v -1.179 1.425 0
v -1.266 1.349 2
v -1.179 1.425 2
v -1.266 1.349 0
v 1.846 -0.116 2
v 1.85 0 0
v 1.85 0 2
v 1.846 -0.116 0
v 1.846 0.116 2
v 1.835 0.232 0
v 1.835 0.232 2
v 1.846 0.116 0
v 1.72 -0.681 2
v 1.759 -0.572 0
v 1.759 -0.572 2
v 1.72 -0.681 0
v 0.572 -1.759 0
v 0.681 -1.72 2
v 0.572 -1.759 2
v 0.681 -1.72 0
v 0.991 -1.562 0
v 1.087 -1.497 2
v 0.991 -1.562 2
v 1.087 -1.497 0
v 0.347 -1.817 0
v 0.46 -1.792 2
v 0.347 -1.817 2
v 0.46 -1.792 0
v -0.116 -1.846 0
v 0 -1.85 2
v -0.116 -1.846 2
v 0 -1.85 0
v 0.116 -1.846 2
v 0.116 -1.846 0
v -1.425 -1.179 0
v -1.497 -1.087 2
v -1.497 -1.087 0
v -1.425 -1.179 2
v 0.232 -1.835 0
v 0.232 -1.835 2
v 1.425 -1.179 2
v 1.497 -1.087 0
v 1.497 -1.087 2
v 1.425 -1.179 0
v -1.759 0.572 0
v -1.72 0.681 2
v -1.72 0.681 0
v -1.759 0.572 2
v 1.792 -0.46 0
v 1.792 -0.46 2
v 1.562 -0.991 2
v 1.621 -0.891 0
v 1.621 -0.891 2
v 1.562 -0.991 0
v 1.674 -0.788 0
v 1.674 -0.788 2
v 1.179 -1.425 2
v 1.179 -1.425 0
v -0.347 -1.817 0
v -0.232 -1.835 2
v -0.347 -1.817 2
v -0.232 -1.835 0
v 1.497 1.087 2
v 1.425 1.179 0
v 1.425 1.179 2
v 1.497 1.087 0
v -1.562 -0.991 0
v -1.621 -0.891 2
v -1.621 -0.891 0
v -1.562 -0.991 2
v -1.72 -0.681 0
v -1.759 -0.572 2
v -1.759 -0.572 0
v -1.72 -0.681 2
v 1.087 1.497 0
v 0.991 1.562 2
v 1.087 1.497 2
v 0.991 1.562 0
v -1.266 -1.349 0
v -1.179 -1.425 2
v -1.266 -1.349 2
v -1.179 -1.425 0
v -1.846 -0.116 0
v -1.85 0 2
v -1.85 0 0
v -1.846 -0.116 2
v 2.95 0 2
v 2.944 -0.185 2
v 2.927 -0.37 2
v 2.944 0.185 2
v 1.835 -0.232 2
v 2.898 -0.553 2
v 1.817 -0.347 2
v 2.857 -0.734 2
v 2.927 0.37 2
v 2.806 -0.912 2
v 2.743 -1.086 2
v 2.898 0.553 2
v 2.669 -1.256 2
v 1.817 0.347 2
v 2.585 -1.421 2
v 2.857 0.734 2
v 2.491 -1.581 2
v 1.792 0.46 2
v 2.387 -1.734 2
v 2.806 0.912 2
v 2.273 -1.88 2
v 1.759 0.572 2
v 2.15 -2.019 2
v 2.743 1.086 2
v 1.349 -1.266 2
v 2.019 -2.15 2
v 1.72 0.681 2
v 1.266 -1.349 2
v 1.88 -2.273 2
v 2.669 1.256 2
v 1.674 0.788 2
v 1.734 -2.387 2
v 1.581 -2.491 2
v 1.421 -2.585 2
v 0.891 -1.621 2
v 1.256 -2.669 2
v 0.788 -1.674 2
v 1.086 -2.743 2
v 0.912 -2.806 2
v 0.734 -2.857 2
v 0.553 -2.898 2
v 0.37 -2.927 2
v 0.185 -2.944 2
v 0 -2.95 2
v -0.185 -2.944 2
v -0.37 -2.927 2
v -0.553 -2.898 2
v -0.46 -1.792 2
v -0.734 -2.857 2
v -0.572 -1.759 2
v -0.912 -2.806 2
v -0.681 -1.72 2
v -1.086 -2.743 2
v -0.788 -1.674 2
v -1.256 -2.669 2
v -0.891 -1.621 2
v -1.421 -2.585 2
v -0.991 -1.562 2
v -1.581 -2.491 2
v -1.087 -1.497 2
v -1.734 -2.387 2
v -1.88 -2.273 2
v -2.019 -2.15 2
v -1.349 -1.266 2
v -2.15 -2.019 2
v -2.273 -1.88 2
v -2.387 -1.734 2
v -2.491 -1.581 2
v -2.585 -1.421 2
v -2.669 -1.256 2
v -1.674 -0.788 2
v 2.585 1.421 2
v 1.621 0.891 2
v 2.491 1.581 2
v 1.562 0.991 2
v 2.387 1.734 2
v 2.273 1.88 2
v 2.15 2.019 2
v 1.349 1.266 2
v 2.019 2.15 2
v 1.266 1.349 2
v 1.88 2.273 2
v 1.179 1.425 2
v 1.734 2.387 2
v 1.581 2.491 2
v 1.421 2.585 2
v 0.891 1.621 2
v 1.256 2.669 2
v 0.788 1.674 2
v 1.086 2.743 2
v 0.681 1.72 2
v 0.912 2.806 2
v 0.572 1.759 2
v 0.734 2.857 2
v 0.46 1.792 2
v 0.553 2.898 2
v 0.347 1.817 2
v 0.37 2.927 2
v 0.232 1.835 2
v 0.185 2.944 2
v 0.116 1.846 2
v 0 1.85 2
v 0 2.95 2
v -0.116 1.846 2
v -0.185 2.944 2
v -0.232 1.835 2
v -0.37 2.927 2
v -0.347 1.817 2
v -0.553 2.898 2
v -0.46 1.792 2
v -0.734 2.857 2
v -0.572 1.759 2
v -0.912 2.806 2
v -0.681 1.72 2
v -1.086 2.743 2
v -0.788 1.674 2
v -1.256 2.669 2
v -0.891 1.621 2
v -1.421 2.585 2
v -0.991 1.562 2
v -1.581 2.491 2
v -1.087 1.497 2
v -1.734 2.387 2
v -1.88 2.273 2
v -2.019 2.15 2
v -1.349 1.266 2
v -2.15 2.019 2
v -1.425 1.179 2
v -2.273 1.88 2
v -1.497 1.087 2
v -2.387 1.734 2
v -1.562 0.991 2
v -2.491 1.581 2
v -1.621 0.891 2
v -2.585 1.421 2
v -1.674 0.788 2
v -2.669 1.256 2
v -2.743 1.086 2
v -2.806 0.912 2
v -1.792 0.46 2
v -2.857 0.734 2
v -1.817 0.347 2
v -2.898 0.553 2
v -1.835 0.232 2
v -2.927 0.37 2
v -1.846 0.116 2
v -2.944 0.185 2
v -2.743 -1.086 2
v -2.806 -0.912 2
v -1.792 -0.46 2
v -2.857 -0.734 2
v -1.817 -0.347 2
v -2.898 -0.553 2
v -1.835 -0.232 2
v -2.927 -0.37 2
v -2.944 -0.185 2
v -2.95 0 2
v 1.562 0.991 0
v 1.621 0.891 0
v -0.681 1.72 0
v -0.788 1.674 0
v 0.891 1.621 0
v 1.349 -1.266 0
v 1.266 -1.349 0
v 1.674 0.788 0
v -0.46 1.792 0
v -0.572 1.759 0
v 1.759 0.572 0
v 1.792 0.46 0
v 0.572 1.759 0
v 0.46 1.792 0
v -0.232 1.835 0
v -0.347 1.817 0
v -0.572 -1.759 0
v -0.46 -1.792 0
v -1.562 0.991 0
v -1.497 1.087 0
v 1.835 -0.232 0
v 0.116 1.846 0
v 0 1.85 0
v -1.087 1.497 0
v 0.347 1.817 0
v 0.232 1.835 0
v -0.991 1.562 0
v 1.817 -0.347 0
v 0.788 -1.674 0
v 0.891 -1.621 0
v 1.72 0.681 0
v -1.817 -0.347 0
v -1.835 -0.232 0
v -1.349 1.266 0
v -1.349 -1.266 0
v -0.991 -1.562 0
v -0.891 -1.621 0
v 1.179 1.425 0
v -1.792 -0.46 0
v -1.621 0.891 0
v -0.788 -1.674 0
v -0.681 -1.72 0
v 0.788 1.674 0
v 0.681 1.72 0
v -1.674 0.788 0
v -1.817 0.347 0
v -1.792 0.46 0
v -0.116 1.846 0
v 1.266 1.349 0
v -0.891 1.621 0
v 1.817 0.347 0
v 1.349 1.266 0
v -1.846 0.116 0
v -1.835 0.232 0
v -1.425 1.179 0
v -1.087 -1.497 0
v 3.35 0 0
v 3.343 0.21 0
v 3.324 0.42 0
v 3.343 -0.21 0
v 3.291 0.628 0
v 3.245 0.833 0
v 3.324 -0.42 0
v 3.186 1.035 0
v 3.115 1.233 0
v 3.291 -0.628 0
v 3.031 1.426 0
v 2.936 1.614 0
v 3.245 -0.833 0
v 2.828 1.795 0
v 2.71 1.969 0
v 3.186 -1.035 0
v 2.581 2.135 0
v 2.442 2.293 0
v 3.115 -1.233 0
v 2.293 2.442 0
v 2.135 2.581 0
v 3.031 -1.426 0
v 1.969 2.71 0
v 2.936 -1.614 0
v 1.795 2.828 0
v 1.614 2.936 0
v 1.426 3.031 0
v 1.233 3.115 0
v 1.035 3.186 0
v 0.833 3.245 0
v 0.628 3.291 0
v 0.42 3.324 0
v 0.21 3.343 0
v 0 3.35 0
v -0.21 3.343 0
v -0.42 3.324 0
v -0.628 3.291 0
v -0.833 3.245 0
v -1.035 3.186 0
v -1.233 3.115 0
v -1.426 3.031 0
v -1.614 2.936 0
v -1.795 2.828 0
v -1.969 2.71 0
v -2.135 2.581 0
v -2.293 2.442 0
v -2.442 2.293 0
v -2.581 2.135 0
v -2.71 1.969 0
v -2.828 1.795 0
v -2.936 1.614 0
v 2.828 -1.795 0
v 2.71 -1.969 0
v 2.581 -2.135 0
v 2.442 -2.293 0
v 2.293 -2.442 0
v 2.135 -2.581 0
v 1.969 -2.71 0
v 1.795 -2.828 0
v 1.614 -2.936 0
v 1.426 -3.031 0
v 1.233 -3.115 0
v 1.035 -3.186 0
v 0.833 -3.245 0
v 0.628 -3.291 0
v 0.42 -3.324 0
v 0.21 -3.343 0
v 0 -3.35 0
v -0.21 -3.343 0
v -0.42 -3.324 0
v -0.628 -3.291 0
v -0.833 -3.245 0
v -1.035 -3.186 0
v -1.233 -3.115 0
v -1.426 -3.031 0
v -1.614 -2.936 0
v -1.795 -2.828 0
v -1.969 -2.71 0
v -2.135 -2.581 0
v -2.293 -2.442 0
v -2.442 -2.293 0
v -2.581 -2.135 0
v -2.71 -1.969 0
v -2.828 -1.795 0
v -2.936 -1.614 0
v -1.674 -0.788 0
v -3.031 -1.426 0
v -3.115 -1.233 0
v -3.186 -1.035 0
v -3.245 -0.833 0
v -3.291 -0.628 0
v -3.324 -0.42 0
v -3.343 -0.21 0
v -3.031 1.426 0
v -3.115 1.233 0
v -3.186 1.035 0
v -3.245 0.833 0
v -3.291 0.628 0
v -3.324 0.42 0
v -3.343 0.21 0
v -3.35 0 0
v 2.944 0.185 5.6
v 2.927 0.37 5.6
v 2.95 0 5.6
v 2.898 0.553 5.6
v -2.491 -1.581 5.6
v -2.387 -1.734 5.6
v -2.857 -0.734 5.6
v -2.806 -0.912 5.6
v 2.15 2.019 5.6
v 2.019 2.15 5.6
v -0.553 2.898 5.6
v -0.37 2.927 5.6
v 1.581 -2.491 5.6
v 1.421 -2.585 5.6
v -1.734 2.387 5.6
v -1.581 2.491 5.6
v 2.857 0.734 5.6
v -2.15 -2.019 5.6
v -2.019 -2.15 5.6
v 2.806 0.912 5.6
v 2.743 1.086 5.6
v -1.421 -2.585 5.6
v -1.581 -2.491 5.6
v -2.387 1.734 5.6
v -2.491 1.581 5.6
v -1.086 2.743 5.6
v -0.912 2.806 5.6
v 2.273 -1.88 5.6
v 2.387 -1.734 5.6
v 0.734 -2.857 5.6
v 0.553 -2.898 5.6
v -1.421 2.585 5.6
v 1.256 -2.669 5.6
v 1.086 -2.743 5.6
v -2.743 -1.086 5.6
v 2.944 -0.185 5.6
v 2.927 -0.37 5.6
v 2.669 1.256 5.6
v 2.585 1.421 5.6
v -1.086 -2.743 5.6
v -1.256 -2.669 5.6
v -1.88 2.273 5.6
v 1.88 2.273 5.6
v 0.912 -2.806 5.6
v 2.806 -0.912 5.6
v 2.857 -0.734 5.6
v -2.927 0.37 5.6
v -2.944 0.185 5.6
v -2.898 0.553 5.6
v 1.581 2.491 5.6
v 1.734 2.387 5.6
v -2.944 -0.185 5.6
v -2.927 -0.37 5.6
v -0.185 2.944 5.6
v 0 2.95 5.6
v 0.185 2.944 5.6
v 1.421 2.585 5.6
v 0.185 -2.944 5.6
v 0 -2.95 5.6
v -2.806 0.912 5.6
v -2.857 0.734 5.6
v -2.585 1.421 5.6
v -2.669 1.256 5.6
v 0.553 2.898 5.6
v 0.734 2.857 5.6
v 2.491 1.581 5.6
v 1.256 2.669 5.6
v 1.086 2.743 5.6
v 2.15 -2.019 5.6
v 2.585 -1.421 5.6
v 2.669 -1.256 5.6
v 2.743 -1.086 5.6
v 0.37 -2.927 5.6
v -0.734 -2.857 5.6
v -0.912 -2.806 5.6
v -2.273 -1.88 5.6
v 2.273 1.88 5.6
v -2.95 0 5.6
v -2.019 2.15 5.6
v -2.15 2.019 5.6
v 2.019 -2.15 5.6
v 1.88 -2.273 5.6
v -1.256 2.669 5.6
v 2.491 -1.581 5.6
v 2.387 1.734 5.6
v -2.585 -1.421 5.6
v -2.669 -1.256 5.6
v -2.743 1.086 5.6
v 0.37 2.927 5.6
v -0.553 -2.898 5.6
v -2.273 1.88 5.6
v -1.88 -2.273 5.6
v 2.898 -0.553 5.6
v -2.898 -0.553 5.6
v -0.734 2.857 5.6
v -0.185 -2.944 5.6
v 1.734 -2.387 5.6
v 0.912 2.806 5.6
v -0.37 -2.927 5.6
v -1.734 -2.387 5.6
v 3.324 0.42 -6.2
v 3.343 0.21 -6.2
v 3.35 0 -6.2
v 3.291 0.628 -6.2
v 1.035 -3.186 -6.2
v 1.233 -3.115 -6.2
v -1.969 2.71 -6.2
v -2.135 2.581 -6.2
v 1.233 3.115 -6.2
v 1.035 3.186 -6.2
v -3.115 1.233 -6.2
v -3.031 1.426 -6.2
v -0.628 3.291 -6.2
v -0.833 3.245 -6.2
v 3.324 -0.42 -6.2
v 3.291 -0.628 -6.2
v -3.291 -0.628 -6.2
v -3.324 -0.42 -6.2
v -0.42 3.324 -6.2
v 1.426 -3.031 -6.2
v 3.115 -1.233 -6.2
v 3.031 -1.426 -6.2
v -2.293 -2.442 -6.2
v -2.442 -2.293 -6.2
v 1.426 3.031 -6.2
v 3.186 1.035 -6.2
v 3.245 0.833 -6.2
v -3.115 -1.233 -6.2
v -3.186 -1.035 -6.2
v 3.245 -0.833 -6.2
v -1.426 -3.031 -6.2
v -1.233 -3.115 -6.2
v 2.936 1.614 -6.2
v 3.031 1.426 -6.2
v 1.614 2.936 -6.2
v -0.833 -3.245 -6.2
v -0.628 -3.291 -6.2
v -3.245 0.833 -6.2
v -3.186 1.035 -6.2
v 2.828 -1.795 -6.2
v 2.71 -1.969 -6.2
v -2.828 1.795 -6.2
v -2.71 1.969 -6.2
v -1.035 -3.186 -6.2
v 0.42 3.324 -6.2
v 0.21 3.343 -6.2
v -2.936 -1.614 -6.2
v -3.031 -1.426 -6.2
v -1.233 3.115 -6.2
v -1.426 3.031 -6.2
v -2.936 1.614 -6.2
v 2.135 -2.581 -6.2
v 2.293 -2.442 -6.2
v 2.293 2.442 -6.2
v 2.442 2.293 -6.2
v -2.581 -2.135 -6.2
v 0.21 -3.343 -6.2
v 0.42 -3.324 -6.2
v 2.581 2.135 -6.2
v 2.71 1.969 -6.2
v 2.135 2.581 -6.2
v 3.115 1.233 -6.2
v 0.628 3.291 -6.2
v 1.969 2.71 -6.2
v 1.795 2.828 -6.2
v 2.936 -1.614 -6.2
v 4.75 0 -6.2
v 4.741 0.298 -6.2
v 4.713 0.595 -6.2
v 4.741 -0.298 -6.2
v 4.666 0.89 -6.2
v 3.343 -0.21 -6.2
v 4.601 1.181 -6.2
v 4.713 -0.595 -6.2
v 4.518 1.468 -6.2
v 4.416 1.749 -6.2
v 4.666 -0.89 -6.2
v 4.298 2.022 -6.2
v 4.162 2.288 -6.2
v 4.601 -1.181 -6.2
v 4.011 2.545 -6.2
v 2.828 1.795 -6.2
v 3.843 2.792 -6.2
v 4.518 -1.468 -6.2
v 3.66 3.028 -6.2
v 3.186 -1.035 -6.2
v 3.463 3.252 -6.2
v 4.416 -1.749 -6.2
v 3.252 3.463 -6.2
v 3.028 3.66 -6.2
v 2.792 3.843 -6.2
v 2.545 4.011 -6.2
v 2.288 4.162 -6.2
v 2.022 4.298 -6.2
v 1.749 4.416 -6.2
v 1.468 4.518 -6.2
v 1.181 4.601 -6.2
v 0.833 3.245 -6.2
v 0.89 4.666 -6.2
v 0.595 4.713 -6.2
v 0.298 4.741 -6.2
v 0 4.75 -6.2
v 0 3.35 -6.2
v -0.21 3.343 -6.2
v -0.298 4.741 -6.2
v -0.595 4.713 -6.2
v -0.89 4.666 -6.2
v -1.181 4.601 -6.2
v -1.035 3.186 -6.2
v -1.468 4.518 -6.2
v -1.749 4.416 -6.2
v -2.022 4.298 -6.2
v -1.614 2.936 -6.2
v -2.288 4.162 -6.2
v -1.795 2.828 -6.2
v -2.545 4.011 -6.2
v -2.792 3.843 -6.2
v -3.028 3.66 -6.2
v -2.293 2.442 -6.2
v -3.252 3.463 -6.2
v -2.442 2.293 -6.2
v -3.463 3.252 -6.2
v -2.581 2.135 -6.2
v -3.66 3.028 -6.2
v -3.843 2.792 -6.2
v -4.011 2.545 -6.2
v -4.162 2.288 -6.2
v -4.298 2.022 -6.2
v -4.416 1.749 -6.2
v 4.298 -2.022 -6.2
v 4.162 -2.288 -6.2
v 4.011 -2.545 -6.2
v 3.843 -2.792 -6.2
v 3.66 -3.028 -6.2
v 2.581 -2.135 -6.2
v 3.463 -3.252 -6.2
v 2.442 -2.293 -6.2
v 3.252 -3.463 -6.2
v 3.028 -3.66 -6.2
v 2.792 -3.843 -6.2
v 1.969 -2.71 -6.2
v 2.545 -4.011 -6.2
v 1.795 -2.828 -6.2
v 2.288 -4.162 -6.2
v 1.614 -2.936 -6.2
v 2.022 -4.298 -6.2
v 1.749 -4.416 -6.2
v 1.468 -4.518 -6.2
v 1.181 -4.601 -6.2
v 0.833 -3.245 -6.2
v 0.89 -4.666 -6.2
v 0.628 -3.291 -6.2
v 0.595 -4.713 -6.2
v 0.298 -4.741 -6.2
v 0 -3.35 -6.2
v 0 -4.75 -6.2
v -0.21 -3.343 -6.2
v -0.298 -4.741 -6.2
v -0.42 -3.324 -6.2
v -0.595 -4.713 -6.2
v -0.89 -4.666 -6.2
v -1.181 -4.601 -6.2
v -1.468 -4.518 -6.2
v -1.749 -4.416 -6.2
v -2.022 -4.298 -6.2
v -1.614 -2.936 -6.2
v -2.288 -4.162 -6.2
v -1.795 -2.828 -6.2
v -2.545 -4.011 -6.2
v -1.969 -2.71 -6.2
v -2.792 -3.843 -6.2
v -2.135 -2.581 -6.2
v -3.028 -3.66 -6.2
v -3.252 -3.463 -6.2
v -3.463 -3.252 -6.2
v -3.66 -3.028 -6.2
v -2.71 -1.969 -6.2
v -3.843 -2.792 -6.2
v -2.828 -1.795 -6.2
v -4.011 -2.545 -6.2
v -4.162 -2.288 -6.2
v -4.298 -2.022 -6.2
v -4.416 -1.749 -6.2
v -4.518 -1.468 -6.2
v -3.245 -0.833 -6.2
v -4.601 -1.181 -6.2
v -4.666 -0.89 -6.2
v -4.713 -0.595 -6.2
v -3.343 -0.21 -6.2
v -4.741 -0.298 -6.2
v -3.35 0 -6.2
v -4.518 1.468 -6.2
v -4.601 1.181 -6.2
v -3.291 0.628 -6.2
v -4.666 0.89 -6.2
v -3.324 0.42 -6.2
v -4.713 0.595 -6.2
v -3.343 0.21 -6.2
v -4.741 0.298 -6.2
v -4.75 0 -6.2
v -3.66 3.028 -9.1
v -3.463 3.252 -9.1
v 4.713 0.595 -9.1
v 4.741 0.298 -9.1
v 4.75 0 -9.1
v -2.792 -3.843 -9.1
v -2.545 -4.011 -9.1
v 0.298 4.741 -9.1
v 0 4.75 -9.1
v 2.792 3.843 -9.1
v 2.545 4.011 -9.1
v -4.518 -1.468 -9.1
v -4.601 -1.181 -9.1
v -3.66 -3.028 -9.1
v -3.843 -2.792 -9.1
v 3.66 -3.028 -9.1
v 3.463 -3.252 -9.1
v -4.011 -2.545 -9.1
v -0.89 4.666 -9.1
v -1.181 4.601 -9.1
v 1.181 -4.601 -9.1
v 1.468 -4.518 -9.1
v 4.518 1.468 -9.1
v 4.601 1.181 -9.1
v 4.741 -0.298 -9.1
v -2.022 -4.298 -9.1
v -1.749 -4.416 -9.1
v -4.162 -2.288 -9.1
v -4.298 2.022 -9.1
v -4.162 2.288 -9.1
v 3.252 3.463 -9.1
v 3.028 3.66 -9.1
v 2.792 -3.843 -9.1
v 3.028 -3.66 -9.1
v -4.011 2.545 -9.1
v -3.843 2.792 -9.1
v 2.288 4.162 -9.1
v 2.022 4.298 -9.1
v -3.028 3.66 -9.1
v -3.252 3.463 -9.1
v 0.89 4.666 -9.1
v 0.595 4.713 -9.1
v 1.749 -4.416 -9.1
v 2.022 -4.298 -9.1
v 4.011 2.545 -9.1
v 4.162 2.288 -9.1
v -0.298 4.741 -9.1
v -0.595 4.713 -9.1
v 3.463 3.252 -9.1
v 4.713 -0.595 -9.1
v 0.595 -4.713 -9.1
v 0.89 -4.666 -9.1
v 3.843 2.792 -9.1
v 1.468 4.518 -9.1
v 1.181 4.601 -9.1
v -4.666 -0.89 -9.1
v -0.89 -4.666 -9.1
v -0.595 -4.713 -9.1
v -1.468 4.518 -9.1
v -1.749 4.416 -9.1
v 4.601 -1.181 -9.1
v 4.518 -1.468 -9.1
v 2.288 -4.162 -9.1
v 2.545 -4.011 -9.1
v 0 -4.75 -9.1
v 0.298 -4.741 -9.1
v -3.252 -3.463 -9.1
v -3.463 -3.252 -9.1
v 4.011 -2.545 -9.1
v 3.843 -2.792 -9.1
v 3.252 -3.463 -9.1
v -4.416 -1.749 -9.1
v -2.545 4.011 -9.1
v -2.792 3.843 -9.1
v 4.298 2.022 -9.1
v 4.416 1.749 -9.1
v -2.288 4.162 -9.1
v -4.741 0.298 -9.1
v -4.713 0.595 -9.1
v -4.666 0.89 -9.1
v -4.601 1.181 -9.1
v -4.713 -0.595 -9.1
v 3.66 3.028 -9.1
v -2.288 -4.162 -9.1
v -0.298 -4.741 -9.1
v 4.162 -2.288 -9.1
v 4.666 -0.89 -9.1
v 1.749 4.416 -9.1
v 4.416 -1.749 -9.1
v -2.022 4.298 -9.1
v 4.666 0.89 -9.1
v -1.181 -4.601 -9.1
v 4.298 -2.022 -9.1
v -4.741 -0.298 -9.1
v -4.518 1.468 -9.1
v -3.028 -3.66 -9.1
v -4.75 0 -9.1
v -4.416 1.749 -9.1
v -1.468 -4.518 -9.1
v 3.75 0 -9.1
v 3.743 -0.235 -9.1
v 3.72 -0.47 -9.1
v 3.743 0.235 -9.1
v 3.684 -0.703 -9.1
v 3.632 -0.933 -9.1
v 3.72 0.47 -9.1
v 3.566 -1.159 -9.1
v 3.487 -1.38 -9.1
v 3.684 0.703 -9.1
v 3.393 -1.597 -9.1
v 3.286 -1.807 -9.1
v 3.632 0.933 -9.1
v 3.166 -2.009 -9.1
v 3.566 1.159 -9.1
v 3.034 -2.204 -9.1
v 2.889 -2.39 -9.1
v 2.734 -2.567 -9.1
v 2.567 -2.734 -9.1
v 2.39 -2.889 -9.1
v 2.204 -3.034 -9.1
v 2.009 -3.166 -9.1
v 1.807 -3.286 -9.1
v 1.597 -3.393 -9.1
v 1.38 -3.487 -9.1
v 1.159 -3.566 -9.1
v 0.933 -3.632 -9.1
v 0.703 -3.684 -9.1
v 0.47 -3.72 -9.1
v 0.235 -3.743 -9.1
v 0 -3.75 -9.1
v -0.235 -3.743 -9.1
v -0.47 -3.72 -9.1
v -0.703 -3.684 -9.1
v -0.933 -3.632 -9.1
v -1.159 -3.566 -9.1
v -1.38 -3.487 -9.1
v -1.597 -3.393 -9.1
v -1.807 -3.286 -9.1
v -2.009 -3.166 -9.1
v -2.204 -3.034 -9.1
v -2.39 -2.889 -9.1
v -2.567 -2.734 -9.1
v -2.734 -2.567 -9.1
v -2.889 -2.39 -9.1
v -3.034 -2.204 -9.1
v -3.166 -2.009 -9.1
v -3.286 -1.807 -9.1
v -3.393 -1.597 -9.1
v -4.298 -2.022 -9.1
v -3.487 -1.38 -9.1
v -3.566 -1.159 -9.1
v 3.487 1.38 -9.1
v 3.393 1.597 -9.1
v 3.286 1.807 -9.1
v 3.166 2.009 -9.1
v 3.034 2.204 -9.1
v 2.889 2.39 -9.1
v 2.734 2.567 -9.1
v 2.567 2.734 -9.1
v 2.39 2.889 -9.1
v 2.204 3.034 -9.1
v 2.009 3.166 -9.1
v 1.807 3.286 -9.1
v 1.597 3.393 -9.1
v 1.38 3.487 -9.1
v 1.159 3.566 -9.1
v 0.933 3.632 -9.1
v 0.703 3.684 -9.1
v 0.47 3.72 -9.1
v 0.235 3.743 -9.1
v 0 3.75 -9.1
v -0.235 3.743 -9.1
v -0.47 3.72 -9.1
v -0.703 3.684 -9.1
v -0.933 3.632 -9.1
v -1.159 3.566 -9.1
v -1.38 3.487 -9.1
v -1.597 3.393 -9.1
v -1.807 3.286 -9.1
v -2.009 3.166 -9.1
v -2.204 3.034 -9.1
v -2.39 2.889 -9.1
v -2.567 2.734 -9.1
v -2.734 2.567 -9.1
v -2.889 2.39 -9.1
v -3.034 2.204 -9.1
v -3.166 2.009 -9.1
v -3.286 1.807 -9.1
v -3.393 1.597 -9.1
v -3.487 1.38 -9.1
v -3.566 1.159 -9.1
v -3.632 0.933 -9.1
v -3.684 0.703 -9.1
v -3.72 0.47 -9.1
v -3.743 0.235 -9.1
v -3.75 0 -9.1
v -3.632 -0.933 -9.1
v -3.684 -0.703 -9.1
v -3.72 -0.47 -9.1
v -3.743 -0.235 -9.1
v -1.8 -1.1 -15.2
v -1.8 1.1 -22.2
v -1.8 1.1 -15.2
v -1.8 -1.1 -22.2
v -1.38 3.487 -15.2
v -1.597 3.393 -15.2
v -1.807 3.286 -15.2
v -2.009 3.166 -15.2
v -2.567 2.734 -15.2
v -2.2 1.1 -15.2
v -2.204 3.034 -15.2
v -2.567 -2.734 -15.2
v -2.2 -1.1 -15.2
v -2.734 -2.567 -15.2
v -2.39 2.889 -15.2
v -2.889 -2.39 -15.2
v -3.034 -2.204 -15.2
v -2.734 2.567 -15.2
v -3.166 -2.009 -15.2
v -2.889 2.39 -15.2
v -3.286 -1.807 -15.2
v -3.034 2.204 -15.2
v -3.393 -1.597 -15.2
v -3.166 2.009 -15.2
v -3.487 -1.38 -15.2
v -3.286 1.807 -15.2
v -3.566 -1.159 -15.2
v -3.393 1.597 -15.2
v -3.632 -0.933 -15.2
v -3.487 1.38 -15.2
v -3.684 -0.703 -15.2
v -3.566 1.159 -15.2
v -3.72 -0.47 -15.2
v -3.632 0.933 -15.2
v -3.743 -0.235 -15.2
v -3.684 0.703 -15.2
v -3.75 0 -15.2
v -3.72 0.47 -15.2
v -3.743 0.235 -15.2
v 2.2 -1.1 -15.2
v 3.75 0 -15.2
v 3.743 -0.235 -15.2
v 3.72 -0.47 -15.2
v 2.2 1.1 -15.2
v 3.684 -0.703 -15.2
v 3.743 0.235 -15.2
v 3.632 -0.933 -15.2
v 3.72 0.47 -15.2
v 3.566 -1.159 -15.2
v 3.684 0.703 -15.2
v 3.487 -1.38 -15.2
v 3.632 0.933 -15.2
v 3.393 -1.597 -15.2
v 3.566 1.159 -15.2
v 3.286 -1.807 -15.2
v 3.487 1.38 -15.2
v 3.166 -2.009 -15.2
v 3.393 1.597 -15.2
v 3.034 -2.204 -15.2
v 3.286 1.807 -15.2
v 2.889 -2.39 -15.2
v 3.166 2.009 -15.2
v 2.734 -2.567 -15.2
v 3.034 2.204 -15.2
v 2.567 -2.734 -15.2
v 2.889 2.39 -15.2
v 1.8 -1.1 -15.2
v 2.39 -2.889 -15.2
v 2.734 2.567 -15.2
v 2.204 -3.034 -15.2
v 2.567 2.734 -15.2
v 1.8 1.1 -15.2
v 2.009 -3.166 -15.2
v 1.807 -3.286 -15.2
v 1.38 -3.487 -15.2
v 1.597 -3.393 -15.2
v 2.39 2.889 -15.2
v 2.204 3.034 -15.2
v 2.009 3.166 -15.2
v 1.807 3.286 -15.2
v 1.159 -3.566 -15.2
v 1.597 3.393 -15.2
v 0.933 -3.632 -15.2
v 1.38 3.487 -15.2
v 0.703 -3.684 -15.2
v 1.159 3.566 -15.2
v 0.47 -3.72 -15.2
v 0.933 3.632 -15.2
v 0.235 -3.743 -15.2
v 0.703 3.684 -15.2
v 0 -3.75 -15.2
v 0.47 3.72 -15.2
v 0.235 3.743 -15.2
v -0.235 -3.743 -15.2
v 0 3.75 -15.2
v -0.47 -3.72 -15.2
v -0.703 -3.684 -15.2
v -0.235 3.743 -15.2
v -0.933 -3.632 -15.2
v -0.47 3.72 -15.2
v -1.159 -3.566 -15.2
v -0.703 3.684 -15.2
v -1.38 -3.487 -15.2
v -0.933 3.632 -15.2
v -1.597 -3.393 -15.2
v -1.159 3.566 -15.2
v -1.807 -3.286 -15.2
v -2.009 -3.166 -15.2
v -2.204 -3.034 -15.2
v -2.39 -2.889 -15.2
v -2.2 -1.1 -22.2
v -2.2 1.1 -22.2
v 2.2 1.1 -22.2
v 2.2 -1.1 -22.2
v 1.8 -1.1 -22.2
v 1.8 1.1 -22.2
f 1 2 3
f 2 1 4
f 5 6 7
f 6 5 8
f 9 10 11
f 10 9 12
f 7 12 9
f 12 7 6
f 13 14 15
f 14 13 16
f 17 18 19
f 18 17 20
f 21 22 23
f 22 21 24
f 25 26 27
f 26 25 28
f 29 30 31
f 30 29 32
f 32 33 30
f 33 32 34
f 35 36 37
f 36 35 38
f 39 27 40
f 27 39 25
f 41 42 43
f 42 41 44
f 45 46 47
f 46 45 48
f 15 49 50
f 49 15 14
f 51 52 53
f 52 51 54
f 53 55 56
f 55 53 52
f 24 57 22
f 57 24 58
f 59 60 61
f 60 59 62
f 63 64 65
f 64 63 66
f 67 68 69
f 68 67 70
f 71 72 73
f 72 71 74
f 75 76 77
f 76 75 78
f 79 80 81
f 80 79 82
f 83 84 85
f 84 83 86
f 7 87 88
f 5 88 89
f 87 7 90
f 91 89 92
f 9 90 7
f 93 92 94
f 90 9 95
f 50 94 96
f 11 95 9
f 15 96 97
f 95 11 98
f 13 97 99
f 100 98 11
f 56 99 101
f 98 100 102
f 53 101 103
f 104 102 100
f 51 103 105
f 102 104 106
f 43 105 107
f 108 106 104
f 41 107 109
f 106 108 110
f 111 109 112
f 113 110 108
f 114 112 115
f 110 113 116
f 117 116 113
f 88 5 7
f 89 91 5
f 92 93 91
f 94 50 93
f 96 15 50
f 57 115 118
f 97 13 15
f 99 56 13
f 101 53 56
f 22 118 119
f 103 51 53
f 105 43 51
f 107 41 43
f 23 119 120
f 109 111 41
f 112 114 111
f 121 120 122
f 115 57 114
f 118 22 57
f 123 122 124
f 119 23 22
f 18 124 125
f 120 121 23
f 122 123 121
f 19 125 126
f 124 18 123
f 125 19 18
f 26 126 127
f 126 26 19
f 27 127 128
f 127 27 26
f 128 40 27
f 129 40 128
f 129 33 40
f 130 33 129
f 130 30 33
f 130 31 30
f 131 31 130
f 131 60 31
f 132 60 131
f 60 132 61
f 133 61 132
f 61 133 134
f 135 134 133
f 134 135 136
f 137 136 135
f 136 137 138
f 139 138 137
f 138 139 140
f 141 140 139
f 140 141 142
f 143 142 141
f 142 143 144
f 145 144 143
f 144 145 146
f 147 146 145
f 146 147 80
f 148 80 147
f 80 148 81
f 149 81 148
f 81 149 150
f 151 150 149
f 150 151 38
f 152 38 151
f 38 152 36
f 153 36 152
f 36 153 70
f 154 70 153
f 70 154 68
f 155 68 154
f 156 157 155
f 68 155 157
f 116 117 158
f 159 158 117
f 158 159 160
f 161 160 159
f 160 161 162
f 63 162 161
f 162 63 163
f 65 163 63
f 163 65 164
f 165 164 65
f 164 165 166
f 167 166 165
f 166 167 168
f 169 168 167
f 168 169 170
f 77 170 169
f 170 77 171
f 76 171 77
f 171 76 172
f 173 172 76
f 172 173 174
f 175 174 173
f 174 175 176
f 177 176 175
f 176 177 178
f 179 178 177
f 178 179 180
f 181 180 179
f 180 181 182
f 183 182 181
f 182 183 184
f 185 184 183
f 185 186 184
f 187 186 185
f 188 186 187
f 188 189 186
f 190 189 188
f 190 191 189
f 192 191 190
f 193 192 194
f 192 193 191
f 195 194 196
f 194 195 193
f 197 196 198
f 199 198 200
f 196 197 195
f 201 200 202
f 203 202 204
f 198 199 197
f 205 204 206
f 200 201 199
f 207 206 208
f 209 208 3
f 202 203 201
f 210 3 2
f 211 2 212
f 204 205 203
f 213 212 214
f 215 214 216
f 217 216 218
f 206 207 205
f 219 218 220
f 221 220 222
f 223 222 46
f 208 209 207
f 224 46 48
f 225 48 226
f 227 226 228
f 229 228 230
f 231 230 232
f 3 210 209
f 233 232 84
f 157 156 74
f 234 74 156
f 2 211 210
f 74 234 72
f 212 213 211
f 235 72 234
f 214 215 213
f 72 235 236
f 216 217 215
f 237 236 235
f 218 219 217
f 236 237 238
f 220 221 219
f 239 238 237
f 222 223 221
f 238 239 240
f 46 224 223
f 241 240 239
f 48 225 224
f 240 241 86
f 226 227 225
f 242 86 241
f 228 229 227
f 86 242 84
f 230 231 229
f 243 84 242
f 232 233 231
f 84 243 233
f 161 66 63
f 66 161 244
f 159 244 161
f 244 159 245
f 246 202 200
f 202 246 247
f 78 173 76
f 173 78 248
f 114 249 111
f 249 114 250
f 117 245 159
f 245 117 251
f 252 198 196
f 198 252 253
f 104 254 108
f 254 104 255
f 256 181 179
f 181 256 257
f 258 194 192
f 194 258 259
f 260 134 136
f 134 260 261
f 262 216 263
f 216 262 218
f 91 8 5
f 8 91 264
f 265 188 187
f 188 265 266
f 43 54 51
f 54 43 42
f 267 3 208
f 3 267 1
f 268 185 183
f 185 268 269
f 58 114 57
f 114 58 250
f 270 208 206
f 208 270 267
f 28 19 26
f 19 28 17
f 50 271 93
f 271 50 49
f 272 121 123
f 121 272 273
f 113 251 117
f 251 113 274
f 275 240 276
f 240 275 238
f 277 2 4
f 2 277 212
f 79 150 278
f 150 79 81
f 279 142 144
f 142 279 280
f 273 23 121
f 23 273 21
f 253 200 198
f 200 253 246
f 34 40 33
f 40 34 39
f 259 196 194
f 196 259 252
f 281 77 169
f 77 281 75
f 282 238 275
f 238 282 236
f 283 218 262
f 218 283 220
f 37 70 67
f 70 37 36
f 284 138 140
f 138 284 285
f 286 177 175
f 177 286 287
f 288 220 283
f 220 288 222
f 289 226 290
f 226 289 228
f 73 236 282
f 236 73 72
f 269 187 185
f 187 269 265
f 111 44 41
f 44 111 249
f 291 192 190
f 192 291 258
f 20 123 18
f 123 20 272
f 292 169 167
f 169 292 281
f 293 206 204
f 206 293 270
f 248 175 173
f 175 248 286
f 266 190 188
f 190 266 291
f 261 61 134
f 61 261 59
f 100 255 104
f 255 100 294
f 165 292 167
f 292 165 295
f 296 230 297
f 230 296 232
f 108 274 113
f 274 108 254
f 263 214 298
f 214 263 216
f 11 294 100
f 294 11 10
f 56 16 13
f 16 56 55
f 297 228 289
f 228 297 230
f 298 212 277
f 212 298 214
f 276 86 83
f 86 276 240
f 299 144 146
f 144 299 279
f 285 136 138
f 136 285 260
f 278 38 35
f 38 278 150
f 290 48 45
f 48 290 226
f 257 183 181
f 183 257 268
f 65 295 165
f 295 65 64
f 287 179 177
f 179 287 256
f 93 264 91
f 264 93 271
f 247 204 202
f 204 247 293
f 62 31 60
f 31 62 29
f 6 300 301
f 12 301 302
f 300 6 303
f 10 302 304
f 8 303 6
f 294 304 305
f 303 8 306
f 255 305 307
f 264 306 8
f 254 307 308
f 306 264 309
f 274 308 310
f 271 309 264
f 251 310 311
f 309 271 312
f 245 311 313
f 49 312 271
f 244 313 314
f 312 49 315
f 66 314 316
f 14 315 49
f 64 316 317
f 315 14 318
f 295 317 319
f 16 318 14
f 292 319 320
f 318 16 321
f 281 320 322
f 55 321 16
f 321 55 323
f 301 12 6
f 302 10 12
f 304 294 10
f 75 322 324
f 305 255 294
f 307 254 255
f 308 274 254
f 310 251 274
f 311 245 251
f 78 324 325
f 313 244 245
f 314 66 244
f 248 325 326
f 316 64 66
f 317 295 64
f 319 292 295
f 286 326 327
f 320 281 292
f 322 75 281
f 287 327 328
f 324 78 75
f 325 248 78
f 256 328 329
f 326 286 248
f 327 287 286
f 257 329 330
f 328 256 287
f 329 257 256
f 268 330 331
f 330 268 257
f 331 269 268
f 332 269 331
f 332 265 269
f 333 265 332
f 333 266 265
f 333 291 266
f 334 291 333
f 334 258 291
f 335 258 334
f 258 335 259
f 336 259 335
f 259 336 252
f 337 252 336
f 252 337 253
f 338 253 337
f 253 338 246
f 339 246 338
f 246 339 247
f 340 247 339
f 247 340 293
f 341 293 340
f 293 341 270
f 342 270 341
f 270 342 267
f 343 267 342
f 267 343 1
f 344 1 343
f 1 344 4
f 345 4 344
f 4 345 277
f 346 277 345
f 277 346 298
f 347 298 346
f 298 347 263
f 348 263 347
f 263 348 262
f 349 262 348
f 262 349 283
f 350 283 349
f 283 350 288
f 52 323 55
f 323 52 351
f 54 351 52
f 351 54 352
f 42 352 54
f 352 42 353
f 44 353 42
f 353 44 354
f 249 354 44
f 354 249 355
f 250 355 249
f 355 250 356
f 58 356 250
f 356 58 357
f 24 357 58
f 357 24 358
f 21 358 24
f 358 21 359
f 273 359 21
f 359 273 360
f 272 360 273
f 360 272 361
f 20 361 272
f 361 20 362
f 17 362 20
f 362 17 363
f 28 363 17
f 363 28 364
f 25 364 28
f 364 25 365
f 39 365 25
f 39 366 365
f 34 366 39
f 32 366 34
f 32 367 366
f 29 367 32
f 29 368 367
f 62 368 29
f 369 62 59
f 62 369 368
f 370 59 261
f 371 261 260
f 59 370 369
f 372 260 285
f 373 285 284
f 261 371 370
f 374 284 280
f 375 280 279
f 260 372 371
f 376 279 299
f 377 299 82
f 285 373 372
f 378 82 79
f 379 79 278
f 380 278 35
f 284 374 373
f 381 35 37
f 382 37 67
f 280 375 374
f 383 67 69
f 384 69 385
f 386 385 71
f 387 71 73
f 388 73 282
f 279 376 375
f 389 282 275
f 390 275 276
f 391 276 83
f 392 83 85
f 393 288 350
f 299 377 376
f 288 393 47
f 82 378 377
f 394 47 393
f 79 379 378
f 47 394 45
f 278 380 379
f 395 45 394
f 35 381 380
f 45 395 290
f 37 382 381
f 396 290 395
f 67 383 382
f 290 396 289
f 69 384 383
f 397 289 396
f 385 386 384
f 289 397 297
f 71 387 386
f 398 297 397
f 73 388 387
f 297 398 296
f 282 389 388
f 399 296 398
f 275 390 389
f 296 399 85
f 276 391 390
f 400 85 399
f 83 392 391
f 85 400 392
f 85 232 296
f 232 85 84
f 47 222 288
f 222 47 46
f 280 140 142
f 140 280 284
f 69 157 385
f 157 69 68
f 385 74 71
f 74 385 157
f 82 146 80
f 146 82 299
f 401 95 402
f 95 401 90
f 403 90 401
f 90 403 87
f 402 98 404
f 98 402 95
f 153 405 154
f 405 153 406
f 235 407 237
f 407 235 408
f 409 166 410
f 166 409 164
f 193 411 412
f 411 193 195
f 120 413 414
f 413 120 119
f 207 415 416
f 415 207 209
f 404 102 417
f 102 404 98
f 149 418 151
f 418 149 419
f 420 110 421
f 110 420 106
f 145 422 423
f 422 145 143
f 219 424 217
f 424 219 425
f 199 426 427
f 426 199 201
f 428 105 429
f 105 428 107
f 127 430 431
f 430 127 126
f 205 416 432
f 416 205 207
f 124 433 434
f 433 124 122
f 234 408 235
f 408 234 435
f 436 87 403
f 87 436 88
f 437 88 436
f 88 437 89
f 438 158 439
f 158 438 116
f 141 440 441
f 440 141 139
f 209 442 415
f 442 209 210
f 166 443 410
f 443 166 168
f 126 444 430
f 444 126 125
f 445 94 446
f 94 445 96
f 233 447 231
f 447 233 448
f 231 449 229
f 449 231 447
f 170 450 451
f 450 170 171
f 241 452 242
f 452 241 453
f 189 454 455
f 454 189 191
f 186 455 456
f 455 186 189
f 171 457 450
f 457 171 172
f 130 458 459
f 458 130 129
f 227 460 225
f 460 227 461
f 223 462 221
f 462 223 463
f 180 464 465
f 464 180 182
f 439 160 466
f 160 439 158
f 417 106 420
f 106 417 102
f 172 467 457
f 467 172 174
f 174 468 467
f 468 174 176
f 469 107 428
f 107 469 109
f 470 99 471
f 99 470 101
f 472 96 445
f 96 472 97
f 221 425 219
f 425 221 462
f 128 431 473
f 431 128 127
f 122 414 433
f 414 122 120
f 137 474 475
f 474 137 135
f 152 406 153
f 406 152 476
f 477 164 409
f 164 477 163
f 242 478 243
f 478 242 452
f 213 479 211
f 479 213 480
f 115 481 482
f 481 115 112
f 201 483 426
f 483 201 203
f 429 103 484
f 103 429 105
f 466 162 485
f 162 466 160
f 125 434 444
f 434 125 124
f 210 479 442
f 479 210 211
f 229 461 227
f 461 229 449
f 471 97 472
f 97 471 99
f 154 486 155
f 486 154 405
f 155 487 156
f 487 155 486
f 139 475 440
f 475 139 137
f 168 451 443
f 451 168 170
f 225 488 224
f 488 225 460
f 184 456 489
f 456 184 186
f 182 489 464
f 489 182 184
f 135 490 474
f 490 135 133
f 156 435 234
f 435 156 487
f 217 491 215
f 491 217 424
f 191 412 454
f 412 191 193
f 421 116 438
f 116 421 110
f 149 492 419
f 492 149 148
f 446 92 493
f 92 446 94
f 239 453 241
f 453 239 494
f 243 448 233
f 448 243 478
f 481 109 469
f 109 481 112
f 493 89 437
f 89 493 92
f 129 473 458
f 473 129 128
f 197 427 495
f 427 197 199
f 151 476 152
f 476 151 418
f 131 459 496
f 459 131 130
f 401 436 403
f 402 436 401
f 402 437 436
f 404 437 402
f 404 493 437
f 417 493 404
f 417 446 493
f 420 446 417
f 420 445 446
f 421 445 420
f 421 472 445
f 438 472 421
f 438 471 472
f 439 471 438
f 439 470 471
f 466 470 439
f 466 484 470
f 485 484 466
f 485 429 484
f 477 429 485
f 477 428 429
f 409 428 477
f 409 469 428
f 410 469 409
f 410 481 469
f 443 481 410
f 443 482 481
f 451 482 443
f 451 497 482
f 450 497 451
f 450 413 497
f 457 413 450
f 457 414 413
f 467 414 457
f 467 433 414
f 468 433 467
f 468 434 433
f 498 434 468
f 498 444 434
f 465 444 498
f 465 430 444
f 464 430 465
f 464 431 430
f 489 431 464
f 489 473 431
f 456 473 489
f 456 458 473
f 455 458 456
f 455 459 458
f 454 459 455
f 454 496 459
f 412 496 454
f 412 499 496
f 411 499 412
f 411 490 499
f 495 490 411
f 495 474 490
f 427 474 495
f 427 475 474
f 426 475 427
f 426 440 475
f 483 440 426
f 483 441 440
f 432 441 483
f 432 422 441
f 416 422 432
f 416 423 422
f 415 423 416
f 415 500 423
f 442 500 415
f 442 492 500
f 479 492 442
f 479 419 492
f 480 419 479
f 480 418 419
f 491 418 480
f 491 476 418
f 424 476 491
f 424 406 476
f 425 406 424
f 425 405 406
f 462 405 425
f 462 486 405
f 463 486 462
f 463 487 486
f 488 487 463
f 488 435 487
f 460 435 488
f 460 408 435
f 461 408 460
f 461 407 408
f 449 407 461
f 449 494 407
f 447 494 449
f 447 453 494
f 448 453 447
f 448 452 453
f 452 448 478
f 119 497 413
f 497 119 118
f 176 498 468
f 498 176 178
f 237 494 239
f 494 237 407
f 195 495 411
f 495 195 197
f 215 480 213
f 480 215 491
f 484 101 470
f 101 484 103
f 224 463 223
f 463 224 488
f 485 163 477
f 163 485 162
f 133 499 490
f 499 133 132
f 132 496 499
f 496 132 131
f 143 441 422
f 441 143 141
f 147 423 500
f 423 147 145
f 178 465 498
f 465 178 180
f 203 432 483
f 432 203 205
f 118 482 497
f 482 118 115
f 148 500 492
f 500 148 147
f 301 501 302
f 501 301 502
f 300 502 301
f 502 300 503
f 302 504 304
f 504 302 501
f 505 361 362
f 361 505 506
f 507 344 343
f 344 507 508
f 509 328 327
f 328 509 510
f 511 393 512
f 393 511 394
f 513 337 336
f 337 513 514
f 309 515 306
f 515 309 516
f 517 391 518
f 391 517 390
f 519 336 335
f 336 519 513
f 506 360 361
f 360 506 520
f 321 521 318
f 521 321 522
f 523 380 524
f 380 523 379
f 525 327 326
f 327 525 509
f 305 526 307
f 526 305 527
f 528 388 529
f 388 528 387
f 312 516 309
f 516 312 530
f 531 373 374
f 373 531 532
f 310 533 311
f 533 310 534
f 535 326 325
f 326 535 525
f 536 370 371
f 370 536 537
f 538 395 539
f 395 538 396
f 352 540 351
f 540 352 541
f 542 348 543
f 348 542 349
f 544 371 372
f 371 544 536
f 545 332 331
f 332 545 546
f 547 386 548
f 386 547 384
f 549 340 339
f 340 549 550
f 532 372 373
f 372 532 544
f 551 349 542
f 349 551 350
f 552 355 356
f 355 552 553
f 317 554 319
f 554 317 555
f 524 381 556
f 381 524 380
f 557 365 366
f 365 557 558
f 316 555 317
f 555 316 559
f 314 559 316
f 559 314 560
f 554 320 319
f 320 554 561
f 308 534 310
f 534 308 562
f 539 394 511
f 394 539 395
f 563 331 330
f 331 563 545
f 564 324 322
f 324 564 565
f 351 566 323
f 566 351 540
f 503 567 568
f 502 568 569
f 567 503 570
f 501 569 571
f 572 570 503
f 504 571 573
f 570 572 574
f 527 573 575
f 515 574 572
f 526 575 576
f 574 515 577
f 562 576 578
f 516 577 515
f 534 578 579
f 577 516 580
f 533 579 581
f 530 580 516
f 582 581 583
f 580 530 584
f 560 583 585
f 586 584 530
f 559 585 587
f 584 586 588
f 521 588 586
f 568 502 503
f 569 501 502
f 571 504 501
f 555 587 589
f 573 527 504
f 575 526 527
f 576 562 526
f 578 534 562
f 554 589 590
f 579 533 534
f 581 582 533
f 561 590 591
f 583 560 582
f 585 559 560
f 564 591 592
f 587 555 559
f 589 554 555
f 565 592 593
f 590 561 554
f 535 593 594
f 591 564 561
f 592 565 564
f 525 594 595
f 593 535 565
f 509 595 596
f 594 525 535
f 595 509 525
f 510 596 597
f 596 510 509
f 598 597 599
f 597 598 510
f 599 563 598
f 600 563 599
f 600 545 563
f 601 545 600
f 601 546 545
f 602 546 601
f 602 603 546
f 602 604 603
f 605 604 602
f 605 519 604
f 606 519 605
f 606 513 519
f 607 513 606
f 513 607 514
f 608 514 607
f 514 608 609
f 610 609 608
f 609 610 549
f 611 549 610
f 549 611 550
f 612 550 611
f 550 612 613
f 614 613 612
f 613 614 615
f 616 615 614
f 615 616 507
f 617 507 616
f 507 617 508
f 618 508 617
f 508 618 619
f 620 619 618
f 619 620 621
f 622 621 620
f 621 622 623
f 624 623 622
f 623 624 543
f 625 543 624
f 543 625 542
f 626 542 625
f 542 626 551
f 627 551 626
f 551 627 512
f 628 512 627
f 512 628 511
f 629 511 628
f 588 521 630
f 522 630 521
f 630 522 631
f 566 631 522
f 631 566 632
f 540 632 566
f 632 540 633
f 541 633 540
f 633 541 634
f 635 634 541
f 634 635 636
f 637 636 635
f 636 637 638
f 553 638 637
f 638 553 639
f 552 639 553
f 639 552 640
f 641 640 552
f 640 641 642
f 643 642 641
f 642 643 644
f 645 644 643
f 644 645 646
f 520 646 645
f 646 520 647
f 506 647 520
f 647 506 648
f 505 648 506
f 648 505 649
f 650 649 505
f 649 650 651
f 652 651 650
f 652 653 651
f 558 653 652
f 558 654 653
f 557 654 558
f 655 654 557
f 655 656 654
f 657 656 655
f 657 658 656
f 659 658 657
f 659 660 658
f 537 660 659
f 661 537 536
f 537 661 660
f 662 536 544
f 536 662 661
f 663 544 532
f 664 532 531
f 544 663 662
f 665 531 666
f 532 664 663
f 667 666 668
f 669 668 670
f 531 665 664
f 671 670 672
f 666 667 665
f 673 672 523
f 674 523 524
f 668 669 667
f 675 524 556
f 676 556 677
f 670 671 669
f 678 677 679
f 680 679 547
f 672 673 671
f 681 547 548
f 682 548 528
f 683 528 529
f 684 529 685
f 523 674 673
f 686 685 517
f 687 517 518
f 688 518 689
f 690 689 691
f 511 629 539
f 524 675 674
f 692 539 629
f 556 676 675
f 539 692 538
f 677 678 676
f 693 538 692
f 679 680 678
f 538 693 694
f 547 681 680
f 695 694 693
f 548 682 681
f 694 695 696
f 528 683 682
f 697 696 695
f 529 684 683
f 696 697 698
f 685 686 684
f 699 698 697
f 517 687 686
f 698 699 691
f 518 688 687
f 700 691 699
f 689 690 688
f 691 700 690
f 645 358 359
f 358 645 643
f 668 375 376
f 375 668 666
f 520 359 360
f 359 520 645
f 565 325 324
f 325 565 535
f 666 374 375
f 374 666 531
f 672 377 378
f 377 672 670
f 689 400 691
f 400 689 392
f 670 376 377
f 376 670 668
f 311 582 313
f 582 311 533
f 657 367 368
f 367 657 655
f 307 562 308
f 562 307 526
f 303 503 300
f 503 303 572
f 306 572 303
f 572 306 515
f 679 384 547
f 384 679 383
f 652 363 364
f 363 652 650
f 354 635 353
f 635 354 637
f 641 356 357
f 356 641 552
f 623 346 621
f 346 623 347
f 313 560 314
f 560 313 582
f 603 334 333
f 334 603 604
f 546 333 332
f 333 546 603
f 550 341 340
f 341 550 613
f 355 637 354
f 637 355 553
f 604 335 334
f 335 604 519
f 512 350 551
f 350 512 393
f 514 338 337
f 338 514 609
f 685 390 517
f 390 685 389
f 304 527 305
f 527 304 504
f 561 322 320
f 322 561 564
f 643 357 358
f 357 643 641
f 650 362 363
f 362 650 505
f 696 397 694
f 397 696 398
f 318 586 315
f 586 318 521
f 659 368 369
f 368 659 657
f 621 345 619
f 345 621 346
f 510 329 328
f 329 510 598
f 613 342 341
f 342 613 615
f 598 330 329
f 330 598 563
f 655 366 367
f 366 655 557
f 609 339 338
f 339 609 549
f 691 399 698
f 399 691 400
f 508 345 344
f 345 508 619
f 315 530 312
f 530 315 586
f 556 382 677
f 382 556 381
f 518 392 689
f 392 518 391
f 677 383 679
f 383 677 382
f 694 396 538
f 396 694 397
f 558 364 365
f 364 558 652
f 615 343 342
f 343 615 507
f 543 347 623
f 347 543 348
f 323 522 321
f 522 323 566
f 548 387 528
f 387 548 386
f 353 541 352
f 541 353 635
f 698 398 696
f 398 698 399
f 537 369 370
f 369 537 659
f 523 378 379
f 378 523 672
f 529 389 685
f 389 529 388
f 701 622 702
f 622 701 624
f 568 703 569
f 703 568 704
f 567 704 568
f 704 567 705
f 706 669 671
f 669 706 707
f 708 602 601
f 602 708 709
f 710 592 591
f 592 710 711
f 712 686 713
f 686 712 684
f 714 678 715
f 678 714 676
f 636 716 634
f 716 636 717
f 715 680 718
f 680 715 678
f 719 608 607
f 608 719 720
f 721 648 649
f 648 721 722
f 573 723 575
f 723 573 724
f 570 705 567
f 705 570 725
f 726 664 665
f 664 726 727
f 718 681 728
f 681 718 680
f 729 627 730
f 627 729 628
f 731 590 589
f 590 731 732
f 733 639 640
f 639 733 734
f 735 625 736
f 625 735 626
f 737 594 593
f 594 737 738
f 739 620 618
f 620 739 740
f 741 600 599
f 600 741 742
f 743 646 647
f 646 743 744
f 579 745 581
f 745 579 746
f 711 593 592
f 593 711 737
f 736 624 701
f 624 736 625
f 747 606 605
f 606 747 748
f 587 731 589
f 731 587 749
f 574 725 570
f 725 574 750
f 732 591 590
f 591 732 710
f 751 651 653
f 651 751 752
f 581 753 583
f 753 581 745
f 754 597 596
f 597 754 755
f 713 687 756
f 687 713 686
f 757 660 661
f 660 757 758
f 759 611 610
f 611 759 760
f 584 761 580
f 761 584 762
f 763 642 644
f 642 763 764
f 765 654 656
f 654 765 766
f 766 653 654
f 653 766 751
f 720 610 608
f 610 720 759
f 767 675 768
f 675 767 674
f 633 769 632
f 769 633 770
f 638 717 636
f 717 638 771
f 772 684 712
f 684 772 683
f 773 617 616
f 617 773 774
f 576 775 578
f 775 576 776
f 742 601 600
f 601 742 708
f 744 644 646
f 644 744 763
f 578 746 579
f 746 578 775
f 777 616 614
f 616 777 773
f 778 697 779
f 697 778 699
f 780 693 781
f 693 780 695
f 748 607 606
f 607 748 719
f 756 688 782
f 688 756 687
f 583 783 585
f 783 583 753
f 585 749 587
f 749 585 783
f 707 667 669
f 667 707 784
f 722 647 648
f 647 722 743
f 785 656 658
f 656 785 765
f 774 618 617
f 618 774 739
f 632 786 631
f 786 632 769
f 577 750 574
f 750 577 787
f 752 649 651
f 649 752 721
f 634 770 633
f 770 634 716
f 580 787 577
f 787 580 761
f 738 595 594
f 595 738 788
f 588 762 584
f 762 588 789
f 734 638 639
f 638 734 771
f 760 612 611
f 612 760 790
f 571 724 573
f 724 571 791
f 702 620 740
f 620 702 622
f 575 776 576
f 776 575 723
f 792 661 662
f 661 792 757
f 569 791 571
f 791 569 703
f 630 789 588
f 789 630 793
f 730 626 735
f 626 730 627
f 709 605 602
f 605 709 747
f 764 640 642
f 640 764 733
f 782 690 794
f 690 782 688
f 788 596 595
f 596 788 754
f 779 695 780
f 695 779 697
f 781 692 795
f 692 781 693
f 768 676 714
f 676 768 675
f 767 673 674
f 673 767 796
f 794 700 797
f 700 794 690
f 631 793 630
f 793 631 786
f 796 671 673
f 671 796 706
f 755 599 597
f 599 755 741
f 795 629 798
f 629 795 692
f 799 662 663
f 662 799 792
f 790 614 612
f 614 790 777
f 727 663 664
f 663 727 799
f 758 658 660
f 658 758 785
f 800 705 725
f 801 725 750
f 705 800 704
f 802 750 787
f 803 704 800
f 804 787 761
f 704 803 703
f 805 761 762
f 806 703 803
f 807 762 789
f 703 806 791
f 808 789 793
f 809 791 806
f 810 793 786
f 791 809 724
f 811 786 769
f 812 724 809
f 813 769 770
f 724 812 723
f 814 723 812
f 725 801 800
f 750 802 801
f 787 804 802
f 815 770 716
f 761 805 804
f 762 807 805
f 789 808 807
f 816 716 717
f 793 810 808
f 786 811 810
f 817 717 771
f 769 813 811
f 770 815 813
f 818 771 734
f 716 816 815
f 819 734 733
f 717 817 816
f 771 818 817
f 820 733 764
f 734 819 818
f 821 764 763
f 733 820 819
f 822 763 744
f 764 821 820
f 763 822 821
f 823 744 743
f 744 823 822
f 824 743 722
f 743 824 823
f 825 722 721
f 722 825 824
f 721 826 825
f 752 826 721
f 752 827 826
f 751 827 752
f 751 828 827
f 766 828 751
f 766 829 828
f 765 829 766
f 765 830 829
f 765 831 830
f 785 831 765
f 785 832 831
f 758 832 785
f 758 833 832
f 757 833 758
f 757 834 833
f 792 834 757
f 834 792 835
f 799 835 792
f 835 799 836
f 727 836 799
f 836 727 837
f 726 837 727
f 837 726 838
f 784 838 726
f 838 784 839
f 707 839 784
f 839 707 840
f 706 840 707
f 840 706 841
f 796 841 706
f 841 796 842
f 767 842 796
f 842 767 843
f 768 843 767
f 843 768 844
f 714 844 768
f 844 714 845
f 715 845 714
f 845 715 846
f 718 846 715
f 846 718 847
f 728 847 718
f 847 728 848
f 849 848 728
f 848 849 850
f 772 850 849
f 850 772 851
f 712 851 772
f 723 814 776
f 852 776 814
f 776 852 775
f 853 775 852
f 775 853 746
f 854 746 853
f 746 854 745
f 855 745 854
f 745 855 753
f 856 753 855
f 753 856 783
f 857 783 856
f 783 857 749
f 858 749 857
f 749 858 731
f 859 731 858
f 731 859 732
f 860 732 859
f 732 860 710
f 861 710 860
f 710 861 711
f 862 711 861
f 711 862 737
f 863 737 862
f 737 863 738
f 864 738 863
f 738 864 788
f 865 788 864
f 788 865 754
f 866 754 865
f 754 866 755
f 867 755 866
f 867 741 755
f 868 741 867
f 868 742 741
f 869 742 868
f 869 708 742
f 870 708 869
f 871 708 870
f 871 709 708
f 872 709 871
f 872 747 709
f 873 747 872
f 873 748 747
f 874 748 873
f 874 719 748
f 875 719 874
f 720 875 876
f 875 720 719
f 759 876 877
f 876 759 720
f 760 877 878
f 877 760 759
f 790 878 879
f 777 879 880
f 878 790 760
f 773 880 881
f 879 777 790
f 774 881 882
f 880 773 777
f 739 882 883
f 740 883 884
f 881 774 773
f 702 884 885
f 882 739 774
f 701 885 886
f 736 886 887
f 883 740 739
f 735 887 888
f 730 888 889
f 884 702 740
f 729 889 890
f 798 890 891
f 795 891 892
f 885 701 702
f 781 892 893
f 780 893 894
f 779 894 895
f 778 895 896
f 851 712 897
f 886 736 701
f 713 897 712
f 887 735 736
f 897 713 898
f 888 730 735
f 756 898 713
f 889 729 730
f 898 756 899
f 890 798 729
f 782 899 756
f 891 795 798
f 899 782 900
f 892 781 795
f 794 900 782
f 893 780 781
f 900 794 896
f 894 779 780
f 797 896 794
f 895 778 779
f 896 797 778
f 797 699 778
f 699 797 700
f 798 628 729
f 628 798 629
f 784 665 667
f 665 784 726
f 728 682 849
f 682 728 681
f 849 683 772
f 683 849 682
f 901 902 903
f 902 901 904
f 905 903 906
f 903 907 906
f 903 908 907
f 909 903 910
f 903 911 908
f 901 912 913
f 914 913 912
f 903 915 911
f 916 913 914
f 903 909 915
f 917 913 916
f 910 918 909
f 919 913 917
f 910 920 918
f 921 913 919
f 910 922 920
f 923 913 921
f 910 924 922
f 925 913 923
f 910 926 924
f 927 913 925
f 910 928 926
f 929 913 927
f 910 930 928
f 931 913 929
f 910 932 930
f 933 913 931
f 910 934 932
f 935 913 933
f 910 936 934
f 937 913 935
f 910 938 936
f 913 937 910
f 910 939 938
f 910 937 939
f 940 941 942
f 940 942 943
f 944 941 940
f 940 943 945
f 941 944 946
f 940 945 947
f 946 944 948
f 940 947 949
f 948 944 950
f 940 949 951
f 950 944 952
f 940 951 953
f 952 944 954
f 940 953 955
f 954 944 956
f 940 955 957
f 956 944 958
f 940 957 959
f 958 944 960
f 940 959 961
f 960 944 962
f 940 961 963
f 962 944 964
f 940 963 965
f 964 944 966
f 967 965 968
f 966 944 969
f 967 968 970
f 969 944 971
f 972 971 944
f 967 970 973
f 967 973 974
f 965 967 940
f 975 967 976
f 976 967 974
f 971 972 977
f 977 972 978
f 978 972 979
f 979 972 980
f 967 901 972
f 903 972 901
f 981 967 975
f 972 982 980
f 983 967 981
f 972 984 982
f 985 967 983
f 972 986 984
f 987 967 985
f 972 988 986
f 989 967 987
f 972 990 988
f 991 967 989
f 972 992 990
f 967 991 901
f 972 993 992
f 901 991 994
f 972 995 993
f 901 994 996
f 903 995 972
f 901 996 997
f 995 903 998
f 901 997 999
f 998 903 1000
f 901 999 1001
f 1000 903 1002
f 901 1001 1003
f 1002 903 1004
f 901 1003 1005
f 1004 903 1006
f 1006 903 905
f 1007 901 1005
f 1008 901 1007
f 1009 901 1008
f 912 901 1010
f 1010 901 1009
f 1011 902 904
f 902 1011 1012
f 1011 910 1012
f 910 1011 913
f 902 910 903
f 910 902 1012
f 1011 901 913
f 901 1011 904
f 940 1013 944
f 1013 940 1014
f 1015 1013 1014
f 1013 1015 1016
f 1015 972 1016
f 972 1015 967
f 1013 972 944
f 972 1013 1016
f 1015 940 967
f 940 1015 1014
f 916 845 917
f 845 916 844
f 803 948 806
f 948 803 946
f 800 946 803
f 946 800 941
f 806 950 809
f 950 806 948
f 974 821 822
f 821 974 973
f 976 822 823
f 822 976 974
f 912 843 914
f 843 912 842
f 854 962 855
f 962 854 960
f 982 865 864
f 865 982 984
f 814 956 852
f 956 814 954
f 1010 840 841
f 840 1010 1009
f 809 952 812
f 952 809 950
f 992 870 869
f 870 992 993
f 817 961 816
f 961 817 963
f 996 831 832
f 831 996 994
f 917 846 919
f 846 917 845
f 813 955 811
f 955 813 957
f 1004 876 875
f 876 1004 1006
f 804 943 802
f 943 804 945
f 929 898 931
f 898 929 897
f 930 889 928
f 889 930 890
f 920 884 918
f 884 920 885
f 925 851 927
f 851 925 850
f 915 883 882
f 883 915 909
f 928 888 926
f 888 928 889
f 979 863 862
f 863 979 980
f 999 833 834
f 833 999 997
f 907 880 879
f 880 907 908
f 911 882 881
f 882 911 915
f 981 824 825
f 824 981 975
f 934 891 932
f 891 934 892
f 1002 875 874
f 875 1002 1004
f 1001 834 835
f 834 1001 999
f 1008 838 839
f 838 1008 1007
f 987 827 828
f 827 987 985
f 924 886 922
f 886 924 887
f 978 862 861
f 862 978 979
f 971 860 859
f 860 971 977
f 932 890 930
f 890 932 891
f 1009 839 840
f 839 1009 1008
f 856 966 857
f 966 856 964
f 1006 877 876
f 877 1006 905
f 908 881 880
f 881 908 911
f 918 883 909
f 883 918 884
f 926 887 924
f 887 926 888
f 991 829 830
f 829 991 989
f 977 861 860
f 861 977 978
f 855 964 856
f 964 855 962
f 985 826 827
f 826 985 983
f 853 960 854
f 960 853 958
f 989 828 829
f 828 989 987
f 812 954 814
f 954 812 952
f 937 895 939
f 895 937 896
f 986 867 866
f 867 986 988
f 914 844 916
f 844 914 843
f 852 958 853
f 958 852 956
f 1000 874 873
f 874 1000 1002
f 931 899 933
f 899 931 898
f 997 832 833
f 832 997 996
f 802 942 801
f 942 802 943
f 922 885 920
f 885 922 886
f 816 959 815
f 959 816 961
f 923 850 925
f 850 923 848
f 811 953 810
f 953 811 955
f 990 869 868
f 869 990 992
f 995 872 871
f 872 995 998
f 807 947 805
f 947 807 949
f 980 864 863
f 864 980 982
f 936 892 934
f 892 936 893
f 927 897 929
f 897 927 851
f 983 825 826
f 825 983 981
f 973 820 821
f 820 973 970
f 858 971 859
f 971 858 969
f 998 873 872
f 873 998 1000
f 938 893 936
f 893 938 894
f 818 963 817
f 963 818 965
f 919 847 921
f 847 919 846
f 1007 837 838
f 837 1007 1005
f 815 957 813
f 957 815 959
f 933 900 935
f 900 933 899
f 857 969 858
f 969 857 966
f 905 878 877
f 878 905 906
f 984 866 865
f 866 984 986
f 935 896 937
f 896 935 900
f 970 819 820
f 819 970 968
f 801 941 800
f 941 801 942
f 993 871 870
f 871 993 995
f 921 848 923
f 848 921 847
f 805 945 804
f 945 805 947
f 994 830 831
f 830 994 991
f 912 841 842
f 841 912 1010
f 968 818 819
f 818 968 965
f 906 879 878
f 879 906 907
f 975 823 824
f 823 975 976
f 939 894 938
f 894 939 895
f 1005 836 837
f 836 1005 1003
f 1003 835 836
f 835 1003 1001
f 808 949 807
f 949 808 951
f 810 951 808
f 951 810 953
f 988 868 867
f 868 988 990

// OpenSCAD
$fn = 100;

Cap_Diameter = 5.9;
Cap_Height = 3.6;
Cap_Foot_Diameter = 3.7;
Cap_Foot_Height = 2.0;

Thread_Diameter = 6.7;
Thread_Height = 6.2;

Metal_Base_Diameter = 9.5;
Metal_Base_Height = 2.9;

Plastic_Base_Diameter = 7.5;
Plastic_Base_Height = 6.1;

Pin_Size = [0.4, 2.2, 7.0];
Pin_Distance = 4.0;

SmallButton("#333");

module SmallButton(button_color, metal_color = "#AAA", black = "#222", negative = false) {
  color(button_color) {
    translate([0, 0, 0])
      cylinder(Cap_Foot_Height, d = Cap_Foot_Diameter);
    translate([0, 0, Cap_Foot_Height])
      cylinder(Cap_Height, d = Cap_Diameter);
  }
  color(metal_color) {
    translate([0, 0, -Thread_Height])
      cylinder(Thread_Height, d = Thread_Diameter);
    translate([0, 0, -Thread_Height - Metal_Base_Height])
      cylinder(Metal_Base_Height, d = Metal_Base_Diameter);
  }
  color(black) {
    translate([0, 0, -Thread_Height - Metal_Base_Height - Plastic_Base_Height])
      cylinder(Plastic_Base_Height, d = Plastic_Base_Diameter);
  }
  color(metal_color)
    for (x = [-1, 1]) {
      translate([x * Pin_Distance / 2, 0, -Thread_Height - Metal_Base_Height - Plastic_Base_Height - Pin_Size[2] / 2])
        cube(Pin_Size, center = true);
    }

}
